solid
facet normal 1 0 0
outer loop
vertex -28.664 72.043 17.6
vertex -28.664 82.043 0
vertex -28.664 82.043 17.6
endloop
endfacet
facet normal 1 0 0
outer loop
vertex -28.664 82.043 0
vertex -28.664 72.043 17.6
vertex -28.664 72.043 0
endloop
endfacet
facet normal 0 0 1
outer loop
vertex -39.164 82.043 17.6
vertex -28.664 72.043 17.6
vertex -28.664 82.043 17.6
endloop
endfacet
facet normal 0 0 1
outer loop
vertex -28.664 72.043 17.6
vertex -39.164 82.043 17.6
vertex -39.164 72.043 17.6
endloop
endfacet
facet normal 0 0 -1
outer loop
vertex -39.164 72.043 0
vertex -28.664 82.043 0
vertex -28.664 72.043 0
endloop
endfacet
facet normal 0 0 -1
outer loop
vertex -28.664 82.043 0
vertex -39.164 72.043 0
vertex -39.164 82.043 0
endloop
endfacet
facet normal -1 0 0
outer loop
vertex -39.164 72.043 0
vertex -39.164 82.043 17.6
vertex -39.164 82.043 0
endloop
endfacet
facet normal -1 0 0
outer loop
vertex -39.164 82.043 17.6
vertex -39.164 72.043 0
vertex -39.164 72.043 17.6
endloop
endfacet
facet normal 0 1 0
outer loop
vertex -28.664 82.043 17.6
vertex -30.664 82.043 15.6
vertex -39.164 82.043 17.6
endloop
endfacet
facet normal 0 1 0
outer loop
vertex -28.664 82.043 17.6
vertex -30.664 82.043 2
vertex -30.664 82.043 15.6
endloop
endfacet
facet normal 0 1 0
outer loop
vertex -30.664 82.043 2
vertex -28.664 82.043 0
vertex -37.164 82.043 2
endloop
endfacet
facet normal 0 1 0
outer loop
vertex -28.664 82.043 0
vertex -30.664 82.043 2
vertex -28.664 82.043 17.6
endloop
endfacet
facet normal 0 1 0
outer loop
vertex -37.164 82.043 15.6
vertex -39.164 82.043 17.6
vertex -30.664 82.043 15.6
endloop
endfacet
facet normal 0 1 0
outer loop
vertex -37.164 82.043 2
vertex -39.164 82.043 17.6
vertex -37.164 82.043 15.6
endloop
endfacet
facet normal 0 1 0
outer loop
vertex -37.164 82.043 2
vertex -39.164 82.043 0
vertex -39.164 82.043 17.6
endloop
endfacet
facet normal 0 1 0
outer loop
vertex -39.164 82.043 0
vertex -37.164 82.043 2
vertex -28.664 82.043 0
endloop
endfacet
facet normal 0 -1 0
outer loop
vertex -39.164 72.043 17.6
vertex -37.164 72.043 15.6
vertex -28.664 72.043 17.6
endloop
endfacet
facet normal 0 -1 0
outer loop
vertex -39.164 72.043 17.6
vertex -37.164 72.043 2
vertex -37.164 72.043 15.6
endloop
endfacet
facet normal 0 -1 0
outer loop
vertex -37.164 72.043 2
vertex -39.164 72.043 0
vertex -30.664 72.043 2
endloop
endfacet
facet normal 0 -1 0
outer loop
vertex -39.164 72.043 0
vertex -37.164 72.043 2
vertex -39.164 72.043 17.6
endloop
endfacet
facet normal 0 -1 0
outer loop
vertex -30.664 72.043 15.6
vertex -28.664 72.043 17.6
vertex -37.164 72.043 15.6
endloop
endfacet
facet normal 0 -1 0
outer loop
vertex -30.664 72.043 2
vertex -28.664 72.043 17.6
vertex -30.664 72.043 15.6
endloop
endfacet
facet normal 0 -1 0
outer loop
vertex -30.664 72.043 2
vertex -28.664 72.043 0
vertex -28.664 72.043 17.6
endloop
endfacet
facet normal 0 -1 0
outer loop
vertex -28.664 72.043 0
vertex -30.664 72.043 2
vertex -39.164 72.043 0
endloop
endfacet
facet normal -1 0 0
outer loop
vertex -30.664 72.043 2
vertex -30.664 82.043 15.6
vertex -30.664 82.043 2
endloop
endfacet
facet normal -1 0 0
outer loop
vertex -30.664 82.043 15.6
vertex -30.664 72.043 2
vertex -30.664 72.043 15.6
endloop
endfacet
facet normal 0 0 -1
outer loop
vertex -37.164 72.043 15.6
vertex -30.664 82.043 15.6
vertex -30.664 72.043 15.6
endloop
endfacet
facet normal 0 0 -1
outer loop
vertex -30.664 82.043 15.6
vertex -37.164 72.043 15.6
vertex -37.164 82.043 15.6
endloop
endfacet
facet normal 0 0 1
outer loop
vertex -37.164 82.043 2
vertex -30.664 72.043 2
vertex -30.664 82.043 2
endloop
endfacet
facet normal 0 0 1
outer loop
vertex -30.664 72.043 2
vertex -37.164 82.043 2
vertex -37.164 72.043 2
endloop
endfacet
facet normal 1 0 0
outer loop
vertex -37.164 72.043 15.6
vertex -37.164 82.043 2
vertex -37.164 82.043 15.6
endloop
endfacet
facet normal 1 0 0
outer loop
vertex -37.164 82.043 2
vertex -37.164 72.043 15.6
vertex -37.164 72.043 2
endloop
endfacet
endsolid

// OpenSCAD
difference () {
  translate ([-33.91370070064167, 77.04274837508241, 8.8]) {
    cube ([10.5, 10.0, 17.6], center=true);
  }
  translate ([-33.91370070064167, 77.04274837508241, 8.8]) {
    cube ([6.5, 10.0, 13.6], center=true);
  }
}
